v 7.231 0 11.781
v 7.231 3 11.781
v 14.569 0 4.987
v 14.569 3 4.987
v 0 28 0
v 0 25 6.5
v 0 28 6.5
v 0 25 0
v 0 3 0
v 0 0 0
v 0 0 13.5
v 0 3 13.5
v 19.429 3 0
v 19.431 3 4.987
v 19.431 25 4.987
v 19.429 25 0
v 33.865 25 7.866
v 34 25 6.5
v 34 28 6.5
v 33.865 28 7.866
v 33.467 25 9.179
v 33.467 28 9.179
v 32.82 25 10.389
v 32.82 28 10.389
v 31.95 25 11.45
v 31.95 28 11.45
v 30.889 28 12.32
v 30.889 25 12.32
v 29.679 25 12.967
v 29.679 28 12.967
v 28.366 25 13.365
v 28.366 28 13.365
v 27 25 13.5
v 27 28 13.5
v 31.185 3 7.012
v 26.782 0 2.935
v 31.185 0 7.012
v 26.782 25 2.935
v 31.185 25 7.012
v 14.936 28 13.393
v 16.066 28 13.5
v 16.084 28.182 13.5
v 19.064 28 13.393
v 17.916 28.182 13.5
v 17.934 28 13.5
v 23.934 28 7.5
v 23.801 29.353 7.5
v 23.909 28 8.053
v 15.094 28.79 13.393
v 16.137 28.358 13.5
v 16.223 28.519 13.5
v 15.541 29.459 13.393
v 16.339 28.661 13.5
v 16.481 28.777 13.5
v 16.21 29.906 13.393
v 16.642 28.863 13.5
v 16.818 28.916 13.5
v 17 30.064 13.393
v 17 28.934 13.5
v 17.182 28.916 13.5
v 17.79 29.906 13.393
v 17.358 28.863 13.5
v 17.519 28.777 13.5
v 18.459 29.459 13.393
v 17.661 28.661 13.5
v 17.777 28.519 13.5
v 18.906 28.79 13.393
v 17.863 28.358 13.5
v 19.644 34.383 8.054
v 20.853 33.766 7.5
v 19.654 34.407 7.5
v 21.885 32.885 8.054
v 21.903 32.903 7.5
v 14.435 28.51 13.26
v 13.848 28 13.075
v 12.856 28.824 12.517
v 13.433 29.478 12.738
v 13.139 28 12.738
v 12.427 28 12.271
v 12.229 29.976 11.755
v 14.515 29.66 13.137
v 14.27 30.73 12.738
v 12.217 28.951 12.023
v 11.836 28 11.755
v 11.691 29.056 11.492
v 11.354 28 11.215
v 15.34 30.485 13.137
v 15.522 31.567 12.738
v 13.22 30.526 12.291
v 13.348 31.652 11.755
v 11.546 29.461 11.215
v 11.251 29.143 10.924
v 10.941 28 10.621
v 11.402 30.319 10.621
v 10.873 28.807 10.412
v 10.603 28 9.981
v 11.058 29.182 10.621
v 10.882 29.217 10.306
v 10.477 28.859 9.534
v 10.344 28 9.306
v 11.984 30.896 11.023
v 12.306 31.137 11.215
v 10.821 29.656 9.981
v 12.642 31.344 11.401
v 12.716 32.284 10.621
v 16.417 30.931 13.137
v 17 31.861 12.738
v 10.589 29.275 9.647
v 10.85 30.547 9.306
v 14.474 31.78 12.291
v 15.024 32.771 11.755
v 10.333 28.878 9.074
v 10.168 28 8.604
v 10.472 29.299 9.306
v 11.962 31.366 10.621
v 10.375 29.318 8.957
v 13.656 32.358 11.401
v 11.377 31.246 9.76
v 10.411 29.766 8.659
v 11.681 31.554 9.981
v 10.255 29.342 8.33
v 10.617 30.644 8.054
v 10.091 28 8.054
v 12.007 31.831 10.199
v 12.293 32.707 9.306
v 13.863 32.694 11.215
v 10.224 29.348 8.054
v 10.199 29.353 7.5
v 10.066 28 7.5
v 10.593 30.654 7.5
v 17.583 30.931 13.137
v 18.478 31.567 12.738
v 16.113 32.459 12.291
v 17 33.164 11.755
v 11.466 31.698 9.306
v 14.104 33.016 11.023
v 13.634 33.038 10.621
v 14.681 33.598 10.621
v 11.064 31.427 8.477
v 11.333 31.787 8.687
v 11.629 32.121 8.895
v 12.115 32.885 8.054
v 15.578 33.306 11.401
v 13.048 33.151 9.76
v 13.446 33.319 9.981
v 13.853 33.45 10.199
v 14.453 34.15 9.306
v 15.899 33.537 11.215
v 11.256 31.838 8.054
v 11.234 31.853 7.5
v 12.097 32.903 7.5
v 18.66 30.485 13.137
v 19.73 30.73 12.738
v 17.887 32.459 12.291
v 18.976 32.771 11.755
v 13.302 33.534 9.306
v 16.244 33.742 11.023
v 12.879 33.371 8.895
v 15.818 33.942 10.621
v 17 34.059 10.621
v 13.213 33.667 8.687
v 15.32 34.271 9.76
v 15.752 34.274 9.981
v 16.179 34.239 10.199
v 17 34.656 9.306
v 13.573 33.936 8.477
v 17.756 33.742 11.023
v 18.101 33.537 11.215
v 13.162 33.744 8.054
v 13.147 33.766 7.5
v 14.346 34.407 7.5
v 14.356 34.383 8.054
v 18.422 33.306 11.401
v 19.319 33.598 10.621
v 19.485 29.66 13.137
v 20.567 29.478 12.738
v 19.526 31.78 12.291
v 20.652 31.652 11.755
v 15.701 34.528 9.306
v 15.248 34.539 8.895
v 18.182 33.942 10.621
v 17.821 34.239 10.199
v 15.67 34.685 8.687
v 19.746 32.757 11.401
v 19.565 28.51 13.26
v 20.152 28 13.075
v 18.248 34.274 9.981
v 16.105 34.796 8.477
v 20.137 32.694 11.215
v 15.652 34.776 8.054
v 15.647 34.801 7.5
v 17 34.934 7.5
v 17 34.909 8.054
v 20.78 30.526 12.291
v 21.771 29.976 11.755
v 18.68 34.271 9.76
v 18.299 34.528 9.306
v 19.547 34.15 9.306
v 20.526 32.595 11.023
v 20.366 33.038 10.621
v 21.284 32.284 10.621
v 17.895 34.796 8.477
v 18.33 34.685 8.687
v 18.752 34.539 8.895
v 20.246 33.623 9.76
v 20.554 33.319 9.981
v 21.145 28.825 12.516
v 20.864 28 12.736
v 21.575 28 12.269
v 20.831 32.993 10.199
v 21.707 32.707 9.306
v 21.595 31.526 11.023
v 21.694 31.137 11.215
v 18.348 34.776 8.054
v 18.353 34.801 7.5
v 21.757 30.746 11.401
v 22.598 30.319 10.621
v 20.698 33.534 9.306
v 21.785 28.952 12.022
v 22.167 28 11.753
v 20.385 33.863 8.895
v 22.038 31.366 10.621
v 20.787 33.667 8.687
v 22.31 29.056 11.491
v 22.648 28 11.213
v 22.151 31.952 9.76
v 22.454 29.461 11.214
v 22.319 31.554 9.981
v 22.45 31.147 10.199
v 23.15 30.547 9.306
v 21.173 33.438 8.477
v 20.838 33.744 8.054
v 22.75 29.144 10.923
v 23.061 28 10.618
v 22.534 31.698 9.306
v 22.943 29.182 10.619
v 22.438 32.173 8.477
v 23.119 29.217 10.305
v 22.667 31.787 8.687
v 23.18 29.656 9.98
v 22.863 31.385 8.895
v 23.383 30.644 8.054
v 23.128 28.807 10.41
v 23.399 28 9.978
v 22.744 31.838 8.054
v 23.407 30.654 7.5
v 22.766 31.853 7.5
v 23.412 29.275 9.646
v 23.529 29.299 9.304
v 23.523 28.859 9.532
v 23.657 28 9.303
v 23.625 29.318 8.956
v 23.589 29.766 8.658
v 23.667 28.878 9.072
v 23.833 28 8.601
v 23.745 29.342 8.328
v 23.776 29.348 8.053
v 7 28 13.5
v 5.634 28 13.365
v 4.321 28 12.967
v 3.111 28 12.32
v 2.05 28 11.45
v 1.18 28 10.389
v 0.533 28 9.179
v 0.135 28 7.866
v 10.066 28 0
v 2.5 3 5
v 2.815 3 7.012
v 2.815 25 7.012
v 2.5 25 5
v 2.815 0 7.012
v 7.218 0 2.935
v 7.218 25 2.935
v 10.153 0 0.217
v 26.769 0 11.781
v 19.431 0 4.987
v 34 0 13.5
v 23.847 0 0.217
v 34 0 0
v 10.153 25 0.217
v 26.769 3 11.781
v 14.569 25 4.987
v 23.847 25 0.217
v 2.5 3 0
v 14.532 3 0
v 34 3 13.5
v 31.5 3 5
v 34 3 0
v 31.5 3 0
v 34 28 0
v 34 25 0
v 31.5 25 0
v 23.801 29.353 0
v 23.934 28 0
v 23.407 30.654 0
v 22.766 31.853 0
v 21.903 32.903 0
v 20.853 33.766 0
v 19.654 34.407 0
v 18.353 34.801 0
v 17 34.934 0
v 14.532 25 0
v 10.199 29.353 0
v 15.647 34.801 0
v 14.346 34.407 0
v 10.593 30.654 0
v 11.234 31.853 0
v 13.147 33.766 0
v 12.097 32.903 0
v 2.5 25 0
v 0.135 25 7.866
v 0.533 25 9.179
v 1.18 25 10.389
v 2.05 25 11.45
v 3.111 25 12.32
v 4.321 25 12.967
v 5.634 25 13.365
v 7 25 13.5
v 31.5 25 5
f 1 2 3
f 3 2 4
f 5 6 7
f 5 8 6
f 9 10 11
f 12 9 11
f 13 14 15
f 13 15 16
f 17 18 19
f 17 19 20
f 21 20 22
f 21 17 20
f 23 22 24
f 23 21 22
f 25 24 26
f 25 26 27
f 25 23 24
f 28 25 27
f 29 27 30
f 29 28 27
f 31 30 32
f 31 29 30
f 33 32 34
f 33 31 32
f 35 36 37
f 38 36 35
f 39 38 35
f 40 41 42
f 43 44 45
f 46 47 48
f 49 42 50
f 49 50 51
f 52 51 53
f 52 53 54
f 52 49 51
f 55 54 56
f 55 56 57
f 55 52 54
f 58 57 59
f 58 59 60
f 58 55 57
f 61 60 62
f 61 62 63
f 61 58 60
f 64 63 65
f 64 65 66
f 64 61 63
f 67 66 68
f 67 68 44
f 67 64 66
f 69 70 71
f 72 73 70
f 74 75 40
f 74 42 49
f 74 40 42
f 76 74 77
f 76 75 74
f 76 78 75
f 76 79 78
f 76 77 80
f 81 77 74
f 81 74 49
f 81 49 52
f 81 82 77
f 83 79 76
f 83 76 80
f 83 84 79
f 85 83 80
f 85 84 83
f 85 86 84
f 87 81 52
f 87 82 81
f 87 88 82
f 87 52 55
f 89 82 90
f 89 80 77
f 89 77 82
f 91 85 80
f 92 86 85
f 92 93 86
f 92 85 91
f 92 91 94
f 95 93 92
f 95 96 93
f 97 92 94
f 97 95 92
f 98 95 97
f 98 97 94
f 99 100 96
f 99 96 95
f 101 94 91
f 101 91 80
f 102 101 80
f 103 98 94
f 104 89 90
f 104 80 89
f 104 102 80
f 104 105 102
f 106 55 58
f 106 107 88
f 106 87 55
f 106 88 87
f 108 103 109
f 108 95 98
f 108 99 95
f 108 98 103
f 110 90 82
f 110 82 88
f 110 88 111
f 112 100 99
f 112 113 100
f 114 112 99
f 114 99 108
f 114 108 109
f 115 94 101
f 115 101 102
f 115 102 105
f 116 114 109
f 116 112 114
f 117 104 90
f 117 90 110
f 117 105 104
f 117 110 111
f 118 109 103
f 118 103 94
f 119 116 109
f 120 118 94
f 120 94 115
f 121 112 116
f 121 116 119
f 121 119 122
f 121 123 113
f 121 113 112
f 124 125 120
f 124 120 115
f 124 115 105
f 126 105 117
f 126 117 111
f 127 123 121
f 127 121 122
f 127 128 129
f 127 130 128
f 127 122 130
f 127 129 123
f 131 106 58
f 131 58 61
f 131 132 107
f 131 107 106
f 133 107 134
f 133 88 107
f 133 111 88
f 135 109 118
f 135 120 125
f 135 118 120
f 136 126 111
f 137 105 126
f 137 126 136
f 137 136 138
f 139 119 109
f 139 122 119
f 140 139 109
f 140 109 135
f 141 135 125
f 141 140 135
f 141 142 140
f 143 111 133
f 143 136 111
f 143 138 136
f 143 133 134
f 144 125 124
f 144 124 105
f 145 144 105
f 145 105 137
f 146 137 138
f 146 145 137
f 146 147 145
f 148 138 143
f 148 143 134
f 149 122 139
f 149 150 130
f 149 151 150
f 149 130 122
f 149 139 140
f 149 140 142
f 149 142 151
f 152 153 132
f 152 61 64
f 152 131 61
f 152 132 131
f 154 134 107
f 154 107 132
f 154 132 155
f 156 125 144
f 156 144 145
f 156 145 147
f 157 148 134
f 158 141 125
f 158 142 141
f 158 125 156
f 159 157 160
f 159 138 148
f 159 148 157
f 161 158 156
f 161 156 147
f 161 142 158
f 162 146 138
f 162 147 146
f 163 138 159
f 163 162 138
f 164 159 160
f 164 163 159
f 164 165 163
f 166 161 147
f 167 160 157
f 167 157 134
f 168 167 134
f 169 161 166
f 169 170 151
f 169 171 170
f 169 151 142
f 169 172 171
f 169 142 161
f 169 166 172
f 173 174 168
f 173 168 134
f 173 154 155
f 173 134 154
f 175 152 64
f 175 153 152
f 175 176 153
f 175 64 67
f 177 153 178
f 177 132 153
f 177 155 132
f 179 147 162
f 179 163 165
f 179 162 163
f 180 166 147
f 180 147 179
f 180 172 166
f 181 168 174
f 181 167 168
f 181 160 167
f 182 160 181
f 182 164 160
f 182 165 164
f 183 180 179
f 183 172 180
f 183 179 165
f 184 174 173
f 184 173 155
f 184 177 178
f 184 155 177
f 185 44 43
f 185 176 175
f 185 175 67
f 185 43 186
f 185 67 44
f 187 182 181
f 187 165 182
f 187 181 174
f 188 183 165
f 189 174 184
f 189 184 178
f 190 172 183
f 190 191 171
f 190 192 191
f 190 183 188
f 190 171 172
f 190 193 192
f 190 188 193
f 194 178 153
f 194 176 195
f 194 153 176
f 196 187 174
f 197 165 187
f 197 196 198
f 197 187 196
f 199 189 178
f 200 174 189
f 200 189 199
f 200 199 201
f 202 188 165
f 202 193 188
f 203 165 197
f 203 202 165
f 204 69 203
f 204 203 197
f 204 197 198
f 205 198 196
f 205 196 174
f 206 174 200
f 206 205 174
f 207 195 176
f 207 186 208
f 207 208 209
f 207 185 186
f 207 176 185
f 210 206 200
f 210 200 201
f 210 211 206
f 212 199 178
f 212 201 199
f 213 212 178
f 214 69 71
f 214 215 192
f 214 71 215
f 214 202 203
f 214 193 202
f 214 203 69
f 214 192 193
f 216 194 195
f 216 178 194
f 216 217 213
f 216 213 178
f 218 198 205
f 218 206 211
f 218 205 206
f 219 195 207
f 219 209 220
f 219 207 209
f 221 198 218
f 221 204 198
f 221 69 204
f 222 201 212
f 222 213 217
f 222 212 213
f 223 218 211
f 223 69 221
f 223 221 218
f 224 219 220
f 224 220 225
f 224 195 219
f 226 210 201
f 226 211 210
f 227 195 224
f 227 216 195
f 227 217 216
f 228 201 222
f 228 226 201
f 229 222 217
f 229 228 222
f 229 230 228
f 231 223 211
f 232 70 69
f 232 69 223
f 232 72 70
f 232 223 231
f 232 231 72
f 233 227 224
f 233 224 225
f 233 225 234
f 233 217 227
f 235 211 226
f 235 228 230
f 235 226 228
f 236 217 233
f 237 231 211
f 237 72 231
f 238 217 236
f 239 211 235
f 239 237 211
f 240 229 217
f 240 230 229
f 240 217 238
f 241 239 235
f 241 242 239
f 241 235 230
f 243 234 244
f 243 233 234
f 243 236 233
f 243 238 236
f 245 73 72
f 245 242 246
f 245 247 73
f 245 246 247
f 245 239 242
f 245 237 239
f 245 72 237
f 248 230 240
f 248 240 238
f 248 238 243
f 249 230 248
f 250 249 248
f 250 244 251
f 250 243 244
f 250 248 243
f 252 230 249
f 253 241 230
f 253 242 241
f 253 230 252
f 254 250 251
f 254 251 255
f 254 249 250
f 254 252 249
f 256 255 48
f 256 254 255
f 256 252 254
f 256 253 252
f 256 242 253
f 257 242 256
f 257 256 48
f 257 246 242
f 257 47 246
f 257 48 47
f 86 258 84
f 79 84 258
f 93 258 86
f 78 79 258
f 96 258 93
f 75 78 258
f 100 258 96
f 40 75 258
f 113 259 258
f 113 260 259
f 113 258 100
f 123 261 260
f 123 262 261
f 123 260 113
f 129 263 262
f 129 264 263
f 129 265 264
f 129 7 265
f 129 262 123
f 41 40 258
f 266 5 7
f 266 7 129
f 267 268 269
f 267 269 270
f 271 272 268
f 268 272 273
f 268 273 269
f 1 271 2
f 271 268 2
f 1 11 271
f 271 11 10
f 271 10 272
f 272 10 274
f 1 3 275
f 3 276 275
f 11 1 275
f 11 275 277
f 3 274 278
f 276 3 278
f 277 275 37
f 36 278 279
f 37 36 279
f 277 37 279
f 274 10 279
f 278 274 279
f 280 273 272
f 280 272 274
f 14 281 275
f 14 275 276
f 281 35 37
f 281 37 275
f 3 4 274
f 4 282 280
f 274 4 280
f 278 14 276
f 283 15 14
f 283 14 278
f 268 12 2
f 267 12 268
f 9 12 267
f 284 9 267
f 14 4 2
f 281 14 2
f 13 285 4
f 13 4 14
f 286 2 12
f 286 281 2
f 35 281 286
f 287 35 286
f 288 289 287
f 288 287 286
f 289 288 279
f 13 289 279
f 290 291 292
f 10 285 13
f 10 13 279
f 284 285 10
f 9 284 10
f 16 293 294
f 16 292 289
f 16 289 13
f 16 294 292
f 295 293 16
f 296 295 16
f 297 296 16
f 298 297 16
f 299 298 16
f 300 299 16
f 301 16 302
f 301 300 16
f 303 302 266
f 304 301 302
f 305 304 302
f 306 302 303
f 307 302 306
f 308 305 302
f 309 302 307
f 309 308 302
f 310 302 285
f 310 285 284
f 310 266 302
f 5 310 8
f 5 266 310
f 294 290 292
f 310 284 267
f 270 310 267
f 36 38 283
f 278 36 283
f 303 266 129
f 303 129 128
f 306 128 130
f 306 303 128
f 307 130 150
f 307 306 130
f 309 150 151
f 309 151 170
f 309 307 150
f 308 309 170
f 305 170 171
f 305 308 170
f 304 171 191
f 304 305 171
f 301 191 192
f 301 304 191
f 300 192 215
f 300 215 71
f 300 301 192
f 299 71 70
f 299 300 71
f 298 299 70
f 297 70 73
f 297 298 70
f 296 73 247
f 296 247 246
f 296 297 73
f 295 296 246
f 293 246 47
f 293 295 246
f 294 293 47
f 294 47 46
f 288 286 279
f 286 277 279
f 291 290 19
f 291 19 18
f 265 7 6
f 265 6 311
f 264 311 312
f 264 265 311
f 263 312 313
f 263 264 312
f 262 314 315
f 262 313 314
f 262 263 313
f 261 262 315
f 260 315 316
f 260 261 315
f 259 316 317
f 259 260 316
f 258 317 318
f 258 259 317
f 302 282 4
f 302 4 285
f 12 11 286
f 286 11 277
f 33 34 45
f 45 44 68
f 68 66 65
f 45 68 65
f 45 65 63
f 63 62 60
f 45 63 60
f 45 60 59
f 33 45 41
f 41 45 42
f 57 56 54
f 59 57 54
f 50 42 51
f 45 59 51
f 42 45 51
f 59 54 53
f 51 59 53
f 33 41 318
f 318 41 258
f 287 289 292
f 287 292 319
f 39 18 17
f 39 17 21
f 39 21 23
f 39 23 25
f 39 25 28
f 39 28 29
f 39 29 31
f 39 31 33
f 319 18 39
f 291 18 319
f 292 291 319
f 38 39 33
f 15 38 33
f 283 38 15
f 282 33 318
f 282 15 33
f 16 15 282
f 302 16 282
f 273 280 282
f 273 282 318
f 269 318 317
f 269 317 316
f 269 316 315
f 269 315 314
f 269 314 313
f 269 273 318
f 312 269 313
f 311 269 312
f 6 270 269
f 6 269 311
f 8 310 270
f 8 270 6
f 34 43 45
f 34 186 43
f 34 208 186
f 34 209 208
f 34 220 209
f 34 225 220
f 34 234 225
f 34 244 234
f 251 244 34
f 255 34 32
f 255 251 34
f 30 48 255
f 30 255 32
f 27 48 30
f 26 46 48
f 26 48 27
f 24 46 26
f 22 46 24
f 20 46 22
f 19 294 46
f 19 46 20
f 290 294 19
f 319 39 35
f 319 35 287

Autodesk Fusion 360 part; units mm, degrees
sketch "Skizze1" plane through (0, 0, 0) normal (0, 1, 0) x (1, 0, 0)
  line L0 (0, 0) -> (0, -13.5)
  line L1 (0, -13.5) -> (34, -13.5)
  line L2 (34, -13.5) -> (34, 0)
  line L3 (34, 0) -> (0, 0)
  dimension "d1" = 13.5
  dimension "d2" = 34
extrude "Extrusion1" add sketch "Skizze1" along normal blind 3
sketch "Skizze2" plane through (0, 3, 0) normal (0, 1, 0) x (-1, 0, 0)
  line L0 (-34, 0) -> (0, 0)
  line L1 (0, 0) -> (0, 13.5)
  line L2 (0, 13.5) -> (-34, 13.5)
  line L3 (-34, 13.5) -> (-34, 0)
  line L4 (-34, 0) -> (-31.5, 0)
  line L5 (-31.5, 0) -> (-31.5, 5)
  line L6 (-31.5, 5) -> (-29.5, 5)
  line L7 (-29.5, 5) -> (-29.5, 0)
  line L8 (0, 0) -> (-2.5, 0)
  line L9 (-2.5, 0) -> (-2.5, 5)
  line L10 (-2.5, 5) -> (-4.5, 5)
  line L11 (-4.5, 5) -> (-4.5, 0)
  line L12 (-4.5, 5) -> (-4.5, 13.5)
  line L13 (-29.5, 5) -> (-29.5, 13.5)
  line L14 (-4.5, 0) -> (-29.5, 0)
  line L15 (-4.5, 0) -> (-17, 13.5)
  line L16 (-29.5, 0) -> (-17, 13.5)
  line L17 (-25.3803, 4.4492) -> (-29.5, 0)
  line L18 (-31.5, 5) -> (-31.5, 13.5)
  line L19 (-17, 0) -> (-17, 13.5)
  line L20 (-29.5, 0) -> (-26.7824, 2.935)
  line L21 (-26.7824, 2.935) -> (-23.8473, 0.2174)
  line L22 (-26.7824, 2.935) -> (-31.1849, 7.0115)
  line L23 (-31.1849, 7.0115) -> (-26.7688, 11.7809)
  line L24 (-26.7688, 11.7809) -> (-19.4312, 4.9869)
  line L25 (-19.4312, 4.9869) -> (-23.8473, 0.2174)
  line L26 (-4.5, 0) -> (-7.2176, 2.935)
  line L27 (-7.2176, 2.935) -> (-10.1527, 0.2174)
  line L28 (-10.1527, 0.2174) -> (-7.2176, 2.935)
  line L29 (-7.2176, 2.935) -> (-2.8151, 7.0115)
  line L30 (-2.8151, 7.0115) -> (-7.2312, 11.7809)
  line L31 (-7.2312, 11.7809) -> (-14.5688, 4.9869)
  line L32 (-14.5688, 4.9869) -> (-10.1527, 0.2174)
  line L33 (-29.5, 0) -> (-29.5, 5)
  line L34 (-31.5, 5) -> (-29.5, 5)
  line L35 (-19.4312, 4.9869) -> (-19.4286, 0)
  line L36 (-14.5688, 4.9869) -> (-14.5319, 0)
  line L37 (-2.8151, 7.0115) -> (-2.5, 5)
  line L38 (-31.1849, 7.0115) -> (-31.5, 5)
  dimension "d5" = 2.5
  dimension "d6" = 2
  dimension "d7" = 2.5
  dimension "d8" = 5
  dimension "d9" = 2
  dimension "d10" = 4
  dimension "d11" = 4
  dimension "d12" = 6
  dimension "d13" = 6.5
  dimension "d14" = 10
  dimension "d15" = 4
  dimension "d16" = 4
  dimension "d17" = 6
  dimension "d18" = 6.5
  dimension "d19" = 10
extrude "Extrusion2" cut sketch "Skizze2" against normal blind 10 contours L13 L16 L17 L22 L23 L24 | L16 L17 L21 L24 L25 | L13 L22 L23 | L12 L15 L29 L30 L31 | L15 L27 L28 L31 L32 | L12 L29 L30
extrude "Extrusion3" add sketch "Skizze2" along normal blind 21 contours L0 L5 L6 L7 L33 L34 | L0 L14 L16 L17 L20 L21 L25 L35 | L7 L13 L16 L17 L20 L22 L33 | L6 L13 L22 L34 L38 | L0 L14 L15 L26 L27 L28 L32 L36 | L0 L9 L10 L11 | L11 L12 L15 L26 L29 | L10 L12 L29 L37
extrude "Extrusion4" add 2 faces at (5.0509, 24, 1.7391) (28.9491, 24, 1.7391) along direction (0, 1, 0) blind 1
sketch "Skizze3" plane through (0, 0, 0) normal (0, 0, -1) x (-1, 0, 0)
  line L0 (-34, 0) -> (0, 0)
  line L1 (0, 0) -> (0, 3)
  line L2 (0, 3) -> (-2.5, 3)
  line L3 (-2.5, 3) -> (-2.5, 25)
  line L4 (-2.5, 25) -> (-14.5319, 25)
  line L5 (-14.5319, 25) -> (-14.5319, 3)
  line L6 (-14.5319, 3) -> (-19.4286, 3)
  line L7 (-19.4286, 3) -> (-19.4286, 25)
  line L8 (-19.4286, 25) -> (-31.5, 25)
  line L9 (-31.5, 25) -> (-31.5, 3)
  line L10 (-31.5, 3) -> (-34, 3)
  line L11 (-34, 3) -> (-34, 0)
  line L12 (-34, 3) -> (-34, 25)
  line L13 (-34, 25) -> (0, 25)
  line L14 (0, 25) -> (0, 28)
  line L15 (0, 28) -> (-34, 28)
  line L16 (-34, 28) -> (-34, 25)
  line L17 (-17, 28) -> (-17, 21.0656)
  circle A0 centre (-17, 28) radius 6.9344
extrude "Extrusion5" add sketch "Skizze3" against normal blind 13.5 contours L8 L13 L15 L16 A0 | L4 L13 L14 L15 A0 | L8 L13 L15 L17 A0 | L15 A0 | L4 L13 L15 L17 A0
fillet "Abrundung1" radius 6 1 edges at (17, 34.9344, 13.5)
fillet "Abrundung2" radius 4 1 edges at (0, 26.5, 13.5)
fillet "Abrundung3" radius 4 1 edges at (34, 26.5, 13.5)
delete_face "Fläche löschen1" 1 faces at (33.9819, 26, 9.8802)
delete_face "Fläche löschen2" 1 faces at (0.0181, 26, 9.8802)
fillet "Abrundung4" radius 7 1 edges at (34, 26.5, 13.5)
fillet "Abrundung5" radius 7 1 edges at (0, 26.5, 13.5)
